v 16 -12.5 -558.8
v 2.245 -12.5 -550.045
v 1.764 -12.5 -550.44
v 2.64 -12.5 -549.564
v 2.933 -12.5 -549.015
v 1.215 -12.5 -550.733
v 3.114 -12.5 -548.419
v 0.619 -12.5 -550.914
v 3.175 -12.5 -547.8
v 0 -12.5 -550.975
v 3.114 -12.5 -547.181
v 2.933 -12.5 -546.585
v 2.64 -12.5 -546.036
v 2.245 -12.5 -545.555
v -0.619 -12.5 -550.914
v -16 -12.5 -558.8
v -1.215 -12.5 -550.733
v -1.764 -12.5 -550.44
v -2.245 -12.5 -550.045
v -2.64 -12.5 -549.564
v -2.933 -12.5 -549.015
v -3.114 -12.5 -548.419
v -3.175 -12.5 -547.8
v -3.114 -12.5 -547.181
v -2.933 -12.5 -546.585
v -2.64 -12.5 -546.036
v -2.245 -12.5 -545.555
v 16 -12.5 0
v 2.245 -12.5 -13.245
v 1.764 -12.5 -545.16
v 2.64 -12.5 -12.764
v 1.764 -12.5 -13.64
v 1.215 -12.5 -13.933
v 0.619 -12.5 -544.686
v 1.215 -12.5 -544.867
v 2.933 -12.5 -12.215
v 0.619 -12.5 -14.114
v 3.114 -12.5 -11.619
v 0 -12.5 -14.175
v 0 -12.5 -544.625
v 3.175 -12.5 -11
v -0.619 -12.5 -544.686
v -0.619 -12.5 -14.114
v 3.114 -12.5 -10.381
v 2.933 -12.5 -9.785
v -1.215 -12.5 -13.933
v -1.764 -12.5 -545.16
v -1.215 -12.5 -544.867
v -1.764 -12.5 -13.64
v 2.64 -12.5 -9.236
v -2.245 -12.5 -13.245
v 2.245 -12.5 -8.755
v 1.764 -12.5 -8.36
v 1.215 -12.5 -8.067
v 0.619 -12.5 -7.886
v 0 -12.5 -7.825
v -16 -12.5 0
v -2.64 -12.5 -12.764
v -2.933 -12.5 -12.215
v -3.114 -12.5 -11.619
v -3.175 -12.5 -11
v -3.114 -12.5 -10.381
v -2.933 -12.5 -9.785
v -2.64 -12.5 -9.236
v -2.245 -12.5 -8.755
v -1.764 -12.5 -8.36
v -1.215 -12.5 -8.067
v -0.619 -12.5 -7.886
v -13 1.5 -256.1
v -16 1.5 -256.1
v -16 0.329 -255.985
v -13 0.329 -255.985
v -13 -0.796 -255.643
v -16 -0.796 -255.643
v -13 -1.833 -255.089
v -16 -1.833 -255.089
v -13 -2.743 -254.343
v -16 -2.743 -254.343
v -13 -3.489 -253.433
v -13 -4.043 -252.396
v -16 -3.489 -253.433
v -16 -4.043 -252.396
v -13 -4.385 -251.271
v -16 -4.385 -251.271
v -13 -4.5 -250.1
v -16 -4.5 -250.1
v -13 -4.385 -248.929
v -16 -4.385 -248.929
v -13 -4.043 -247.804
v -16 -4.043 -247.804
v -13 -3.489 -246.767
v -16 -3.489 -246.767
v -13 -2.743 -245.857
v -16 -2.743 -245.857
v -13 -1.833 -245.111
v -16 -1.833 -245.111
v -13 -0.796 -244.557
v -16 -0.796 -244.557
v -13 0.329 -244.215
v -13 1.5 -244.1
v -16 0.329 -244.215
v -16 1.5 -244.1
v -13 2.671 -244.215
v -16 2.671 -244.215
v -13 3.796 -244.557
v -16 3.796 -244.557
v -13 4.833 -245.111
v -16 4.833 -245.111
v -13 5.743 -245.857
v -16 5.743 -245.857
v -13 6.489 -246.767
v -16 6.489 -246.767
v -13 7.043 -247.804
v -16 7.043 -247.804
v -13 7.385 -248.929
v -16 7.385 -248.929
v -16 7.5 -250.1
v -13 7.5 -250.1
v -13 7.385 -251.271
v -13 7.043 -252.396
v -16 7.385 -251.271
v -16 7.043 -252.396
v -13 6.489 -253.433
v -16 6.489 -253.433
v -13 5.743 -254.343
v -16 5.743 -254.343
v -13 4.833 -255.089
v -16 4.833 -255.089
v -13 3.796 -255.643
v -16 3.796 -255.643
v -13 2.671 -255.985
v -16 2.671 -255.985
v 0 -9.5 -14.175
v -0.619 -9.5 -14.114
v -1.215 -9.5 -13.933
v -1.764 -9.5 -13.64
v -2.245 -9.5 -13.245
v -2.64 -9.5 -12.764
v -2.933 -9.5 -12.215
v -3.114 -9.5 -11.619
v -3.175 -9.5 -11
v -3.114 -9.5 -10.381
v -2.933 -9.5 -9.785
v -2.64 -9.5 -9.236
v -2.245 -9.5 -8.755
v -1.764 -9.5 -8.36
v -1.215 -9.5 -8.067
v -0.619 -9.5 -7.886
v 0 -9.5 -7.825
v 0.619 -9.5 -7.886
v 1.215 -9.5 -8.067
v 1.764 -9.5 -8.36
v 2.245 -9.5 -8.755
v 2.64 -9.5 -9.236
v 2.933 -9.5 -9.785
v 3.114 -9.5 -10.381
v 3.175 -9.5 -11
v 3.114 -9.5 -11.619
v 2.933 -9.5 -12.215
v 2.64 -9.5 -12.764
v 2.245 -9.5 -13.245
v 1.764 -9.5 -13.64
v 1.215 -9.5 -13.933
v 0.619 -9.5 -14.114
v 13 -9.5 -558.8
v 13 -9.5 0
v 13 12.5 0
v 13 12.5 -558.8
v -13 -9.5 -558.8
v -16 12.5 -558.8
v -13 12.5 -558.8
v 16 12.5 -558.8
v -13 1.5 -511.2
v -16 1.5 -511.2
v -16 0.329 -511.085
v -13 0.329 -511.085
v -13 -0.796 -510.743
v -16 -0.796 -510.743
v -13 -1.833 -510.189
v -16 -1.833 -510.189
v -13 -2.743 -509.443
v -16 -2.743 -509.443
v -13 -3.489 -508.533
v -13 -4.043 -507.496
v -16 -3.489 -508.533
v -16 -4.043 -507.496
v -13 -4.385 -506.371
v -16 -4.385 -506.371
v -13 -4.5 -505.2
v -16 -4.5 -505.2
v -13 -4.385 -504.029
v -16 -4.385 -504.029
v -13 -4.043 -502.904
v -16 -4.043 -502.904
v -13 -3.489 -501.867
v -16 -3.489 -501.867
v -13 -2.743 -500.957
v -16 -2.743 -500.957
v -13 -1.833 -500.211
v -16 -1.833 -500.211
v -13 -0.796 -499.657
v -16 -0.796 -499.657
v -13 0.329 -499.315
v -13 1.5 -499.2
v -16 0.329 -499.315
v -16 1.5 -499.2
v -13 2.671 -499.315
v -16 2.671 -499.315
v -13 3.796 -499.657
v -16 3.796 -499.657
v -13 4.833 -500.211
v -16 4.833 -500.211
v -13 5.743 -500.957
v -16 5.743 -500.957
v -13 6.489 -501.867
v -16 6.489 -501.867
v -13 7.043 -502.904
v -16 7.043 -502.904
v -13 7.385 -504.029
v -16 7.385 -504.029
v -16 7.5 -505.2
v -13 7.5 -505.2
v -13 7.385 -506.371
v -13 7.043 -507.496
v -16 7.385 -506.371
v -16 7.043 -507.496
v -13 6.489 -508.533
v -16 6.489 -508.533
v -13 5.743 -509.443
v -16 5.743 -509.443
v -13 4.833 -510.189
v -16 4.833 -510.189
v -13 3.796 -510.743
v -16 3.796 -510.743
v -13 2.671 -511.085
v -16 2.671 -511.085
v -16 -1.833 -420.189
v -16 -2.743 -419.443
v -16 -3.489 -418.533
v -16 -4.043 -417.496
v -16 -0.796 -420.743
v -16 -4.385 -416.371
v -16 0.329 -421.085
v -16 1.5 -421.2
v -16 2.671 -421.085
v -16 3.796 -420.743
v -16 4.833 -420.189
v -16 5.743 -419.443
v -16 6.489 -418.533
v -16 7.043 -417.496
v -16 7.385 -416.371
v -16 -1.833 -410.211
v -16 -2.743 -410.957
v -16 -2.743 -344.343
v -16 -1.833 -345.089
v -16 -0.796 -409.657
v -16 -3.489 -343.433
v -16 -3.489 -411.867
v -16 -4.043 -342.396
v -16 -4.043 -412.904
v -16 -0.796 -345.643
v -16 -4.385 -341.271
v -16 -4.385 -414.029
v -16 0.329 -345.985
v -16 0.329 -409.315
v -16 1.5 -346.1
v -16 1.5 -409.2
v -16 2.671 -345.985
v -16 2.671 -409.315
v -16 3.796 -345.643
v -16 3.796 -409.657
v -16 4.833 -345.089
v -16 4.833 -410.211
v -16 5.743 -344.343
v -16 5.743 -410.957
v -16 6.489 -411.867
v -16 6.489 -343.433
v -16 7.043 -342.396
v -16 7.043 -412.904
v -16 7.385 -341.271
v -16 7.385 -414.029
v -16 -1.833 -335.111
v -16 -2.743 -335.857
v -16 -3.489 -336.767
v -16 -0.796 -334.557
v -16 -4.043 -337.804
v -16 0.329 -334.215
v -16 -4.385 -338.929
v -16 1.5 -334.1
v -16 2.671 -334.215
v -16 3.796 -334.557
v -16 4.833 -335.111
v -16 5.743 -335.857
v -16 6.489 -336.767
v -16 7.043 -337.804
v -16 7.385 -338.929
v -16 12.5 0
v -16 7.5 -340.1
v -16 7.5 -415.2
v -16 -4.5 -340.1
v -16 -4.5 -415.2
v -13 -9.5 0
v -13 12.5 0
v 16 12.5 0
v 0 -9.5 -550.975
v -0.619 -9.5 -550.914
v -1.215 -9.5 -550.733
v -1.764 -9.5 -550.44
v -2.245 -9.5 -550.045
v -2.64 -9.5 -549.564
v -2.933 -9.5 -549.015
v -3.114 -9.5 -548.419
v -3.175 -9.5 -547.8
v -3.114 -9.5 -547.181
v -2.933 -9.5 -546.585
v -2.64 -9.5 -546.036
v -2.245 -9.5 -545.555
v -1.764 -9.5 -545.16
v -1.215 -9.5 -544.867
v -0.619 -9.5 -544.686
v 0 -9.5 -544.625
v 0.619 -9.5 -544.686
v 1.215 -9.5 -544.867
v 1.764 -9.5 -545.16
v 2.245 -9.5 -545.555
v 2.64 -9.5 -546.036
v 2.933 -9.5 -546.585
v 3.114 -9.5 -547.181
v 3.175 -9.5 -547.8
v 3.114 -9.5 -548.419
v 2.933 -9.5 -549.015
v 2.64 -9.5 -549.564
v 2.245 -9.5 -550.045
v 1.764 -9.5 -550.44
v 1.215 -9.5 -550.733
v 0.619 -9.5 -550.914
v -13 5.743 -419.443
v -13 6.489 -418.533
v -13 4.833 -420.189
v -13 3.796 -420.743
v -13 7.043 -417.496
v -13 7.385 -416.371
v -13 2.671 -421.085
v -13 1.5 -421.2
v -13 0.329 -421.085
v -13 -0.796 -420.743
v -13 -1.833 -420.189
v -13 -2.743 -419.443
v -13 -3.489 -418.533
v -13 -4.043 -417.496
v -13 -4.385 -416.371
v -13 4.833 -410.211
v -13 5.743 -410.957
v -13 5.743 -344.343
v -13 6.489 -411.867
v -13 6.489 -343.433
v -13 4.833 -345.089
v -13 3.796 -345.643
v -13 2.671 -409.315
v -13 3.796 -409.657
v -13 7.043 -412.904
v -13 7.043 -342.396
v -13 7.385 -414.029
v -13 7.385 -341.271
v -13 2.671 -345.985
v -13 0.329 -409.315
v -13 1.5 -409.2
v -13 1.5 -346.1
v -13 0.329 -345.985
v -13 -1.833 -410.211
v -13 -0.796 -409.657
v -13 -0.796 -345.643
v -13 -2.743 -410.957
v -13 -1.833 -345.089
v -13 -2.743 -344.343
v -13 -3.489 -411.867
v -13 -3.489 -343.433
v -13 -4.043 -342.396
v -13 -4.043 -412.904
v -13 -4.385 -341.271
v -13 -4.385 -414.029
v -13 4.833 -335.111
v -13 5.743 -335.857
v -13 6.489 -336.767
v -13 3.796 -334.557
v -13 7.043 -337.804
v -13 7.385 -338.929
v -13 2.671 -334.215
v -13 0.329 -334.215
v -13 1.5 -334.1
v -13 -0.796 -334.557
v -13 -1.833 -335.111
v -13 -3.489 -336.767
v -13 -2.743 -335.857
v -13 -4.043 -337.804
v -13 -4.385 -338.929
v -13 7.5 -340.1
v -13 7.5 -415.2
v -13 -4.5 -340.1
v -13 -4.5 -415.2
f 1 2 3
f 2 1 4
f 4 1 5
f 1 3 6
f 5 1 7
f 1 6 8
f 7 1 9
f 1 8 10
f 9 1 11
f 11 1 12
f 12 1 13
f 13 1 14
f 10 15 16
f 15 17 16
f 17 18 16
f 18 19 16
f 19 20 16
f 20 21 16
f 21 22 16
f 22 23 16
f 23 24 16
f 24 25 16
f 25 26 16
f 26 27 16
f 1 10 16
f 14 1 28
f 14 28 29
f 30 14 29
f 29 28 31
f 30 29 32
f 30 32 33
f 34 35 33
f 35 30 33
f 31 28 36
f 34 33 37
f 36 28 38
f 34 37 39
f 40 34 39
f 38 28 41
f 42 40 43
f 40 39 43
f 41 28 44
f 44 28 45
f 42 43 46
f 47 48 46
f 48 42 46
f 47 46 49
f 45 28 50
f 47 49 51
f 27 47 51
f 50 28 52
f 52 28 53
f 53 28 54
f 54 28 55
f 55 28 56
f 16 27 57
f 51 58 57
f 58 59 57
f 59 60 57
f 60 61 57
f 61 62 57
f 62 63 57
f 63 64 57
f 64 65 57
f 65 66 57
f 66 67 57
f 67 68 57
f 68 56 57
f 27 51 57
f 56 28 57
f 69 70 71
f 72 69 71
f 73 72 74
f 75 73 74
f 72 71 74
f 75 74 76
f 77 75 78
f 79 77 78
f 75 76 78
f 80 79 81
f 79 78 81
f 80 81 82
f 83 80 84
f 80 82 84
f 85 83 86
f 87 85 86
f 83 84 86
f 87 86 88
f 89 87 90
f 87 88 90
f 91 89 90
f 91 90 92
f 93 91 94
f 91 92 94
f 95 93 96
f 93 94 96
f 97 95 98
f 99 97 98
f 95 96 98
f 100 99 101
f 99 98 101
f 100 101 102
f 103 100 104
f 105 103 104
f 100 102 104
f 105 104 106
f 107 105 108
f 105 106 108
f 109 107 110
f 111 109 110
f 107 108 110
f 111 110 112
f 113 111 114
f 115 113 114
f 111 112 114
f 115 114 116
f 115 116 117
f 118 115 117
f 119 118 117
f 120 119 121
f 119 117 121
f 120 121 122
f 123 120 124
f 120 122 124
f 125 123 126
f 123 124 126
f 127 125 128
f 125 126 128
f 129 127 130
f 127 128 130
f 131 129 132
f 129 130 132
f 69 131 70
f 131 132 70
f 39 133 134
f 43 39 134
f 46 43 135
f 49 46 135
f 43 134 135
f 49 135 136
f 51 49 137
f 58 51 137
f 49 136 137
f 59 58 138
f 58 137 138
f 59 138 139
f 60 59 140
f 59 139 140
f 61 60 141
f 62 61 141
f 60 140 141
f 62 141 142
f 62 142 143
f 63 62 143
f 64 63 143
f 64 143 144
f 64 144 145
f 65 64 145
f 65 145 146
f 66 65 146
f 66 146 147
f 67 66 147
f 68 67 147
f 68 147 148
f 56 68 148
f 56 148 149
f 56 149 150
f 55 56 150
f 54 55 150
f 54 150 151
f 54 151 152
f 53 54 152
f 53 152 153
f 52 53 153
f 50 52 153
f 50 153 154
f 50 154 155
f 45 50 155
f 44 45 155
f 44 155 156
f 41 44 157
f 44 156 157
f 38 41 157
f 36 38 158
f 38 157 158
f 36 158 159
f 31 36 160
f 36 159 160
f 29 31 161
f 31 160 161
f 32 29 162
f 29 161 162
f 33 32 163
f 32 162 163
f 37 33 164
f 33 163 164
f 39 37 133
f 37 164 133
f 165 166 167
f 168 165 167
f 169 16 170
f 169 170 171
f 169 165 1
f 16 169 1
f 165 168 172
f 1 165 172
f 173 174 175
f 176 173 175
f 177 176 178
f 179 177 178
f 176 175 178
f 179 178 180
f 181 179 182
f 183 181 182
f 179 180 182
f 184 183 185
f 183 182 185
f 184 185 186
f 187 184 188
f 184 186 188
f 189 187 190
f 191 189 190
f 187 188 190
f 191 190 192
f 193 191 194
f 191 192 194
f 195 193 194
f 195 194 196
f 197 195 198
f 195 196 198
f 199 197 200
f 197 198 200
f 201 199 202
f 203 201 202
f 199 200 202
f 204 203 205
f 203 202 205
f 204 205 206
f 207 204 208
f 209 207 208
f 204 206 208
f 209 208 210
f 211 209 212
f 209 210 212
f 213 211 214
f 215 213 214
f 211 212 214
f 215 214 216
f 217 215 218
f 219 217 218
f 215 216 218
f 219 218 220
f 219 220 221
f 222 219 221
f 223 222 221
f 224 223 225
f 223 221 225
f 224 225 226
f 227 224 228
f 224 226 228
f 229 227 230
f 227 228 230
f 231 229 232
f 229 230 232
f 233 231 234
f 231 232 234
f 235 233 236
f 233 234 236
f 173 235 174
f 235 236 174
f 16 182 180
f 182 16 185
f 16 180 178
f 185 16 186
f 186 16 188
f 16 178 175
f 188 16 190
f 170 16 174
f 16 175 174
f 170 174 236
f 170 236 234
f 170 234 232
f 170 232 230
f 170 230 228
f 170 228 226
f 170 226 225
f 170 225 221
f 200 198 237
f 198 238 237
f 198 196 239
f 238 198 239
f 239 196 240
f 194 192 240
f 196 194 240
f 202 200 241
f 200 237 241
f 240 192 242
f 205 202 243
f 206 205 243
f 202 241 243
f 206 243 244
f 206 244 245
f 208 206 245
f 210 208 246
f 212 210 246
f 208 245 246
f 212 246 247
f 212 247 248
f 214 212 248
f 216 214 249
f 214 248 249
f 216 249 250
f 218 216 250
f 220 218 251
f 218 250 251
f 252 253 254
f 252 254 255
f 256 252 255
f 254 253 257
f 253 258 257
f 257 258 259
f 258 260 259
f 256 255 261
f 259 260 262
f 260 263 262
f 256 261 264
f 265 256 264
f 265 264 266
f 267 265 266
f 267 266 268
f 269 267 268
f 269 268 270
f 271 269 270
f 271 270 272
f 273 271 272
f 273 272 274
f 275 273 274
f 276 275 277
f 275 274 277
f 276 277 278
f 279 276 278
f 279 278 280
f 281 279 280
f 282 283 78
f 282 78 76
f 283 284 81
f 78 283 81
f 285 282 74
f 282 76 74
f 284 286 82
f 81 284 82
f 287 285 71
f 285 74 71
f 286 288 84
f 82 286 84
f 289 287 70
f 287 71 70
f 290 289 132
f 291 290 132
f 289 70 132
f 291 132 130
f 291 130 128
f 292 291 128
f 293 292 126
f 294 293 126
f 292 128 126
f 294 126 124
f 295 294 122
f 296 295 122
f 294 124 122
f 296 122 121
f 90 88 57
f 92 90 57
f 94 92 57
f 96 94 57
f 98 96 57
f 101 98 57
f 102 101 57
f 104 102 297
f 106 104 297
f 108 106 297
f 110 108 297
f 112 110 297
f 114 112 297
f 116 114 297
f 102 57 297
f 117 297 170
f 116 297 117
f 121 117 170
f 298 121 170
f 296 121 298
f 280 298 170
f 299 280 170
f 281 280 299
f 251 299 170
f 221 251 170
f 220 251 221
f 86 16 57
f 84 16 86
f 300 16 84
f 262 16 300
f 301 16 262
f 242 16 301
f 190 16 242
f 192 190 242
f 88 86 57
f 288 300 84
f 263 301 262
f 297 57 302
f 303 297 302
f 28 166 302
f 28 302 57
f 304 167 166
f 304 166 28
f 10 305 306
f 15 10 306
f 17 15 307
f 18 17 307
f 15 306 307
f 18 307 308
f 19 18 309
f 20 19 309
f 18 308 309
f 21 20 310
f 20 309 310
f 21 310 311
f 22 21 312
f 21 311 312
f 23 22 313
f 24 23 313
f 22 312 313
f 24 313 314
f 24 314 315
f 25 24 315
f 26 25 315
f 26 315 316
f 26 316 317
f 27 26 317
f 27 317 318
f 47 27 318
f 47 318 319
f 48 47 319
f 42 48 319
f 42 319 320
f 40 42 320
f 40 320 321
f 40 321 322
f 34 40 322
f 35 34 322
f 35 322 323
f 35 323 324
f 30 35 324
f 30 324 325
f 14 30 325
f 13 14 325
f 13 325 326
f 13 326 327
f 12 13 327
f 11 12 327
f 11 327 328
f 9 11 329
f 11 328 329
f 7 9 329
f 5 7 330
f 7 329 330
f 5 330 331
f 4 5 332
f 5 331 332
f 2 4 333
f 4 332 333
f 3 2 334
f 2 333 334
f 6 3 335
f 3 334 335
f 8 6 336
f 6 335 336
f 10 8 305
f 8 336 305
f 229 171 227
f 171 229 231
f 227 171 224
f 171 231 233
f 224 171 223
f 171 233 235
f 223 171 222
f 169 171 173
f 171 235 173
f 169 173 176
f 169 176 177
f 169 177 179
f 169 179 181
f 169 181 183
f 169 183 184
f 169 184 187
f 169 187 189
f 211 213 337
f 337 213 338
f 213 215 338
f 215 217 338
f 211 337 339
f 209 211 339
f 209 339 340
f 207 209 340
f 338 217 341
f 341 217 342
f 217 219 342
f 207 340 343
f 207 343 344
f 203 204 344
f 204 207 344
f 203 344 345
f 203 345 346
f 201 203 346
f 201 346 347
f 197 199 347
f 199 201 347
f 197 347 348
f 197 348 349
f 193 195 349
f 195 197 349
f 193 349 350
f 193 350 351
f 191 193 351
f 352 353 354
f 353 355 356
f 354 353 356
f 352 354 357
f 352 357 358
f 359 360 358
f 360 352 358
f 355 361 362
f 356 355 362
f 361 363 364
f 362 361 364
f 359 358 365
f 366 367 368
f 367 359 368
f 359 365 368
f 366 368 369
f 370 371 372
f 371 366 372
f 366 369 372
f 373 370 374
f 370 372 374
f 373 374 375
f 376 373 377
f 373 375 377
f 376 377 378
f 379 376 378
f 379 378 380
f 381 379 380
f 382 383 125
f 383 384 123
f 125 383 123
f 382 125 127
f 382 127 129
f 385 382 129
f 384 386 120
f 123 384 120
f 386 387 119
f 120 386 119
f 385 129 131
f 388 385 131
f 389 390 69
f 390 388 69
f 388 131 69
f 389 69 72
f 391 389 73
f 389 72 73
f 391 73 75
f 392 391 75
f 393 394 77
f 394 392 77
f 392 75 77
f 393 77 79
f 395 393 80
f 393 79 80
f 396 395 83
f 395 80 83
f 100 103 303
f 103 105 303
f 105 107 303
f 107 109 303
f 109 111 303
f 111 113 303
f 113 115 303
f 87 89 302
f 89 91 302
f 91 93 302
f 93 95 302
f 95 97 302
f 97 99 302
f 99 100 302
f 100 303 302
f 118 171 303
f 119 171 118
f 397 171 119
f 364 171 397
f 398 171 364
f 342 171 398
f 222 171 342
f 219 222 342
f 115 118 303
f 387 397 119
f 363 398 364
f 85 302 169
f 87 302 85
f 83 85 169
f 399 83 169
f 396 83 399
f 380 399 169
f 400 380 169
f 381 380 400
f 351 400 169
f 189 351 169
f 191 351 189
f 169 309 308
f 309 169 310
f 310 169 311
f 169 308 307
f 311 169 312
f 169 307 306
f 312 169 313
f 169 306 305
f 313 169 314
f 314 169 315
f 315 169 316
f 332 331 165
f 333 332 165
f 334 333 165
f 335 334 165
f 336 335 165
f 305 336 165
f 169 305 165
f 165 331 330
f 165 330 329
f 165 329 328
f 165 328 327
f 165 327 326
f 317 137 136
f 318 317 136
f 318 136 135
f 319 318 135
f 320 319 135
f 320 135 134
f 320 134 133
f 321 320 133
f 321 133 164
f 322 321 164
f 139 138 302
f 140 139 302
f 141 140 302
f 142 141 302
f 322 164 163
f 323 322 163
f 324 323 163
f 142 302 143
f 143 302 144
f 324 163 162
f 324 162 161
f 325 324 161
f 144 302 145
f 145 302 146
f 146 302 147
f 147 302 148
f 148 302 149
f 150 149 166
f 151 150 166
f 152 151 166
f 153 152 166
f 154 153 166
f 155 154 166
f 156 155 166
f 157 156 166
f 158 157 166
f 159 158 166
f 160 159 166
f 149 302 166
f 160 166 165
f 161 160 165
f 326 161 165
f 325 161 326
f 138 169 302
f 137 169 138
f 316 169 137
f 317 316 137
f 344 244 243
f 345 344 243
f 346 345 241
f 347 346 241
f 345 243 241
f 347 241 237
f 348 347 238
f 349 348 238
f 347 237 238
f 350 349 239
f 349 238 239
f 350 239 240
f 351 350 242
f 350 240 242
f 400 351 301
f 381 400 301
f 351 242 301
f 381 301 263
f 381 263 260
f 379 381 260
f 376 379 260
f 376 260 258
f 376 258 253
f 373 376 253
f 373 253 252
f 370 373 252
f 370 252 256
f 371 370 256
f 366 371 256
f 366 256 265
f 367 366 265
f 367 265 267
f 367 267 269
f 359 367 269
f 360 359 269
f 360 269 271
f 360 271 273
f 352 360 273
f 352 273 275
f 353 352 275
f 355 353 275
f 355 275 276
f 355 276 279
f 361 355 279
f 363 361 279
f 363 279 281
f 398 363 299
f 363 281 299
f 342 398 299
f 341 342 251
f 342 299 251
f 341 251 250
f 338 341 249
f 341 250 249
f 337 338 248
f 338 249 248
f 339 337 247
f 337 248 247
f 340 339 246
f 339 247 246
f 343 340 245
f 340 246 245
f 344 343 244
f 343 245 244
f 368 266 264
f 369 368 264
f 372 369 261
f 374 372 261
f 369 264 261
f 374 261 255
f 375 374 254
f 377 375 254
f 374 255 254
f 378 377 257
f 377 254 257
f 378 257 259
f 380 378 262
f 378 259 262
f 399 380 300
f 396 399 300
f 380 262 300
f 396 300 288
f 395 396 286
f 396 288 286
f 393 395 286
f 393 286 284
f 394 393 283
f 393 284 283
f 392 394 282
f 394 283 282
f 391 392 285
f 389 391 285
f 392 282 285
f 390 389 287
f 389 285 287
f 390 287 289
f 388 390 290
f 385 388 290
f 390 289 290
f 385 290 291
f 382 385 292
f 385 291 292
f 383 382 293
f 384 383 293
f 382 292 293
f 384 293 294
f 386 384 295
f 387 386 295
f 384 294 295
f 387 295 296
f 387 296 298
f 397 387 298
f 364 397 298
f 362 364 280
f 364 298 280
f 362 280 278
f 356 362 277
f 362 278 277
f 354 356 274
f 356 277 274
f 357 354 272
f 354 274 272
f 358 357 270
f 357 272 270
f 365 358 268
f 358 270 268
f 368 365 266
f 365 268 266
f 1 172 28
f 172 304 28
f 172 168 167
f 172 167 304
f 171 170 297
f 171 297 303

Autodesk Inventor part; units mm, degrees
ref_plane "YZ Plane" through (0, 0, 0) normal (1, 0, 0) x (0, 1, 0)
ref_plane "XZ Plane" through (0, 0, 0) normal (0, 1, 0) x (-1, 0, 0)
ref_plane "XY Plane" through (0, 0, 0) normal (0, 0, 1) x (1, 0, 0)
sketch "Sketch1" plane through (0, 0, 0) normal (0, 0, 1) x (1, 0, 0)
  line L0 (-16, 12.5) -> (-13, 12.5)
  line L1 (-13, 12.5) -> (-13, -9.5)
  line L2 (-13, -9.5) -> (13, -9.5)
  line L3 (13, -9.5) -> (13, 12.5)
  line L4 (13, 12.5) -> (16, 12.5)
  line L5 (16, 12.5) -> (16, -12.5)
  line L6 (16, -12.5) -> (-16, -12.5)
  line L7 (-16, -12.5) -> (-16, 12.5)
  point P0 (0, 0)
  dimension "d0" = 3
  dimension "d2" = 3
  dimension "d3" = 25
  dimension "d4" = 32
  dimension "d5" = 16
  dimension "d7" = 12.5
  dimension "d8" = 3
  dimension "d74" = 25
extrude "Extrusion1" add sketch "Sketch1" against normal blind 558.8
sketch "Sketch8" plane through (-16, -12.5, 0) normal (0, -1, 0) x (1, 0, 0)
  line L0 (32, -558.8) -> (0, -558.8) projected
  line L1 (32, 0) -> (32, -558.8) projected
  circle A0 centre (16, -547.8) radius 3.175
  line L2 (32, 0) -> (0, 0) projected
  circle A1 centre (16, -11) radius 3.175
  point P0 (16, 0)
  dimension "d114" = 6.35
  dimension "d116" = 16
  dimension "d117" = 11
  dimension "d125" = 6.35
  dimension "d126" = 11
hole "Hole5" at (0, -12.5, -547.8) at (0, -12.5, -11) direction (0, 1, 0) diameter 6.35 end through all
sketch "Sketch9" plane through (-13, -9.5, 0) normal (1, 0, 0) x (0, 0, -1)
  circle A0 centre (505.2, 11) radius 6 projected
  circle A1 centre (415.2, 11) radius 6 projected
  circle A2 centre (340.1, 11) radius 6 projected
  circle A3 centre (250.1, 11) radius 6 projected
  point P0 (0, 9.5)
hole "Hole6" at (-13, 1.5, -340.1) at (-13, 1.5, -250.1) at (-13, 1.5, -505.2) at (-13, 1.5, -415.2) direction (-1, 0, 0) diameter 12 depth 3 tip angle 118
equation "\"d2\" = d0"
equation "\"d5\" = 0.5 * d4"
equation "\"d7\" = 0.5 * d3"
equation "\"d8\" = d0"
equation "\"d74\" = d3"
equation "\"d126\" = d117"
properties part number "Shooter Frame - CIM Mount" material "Aluminum 6061"
